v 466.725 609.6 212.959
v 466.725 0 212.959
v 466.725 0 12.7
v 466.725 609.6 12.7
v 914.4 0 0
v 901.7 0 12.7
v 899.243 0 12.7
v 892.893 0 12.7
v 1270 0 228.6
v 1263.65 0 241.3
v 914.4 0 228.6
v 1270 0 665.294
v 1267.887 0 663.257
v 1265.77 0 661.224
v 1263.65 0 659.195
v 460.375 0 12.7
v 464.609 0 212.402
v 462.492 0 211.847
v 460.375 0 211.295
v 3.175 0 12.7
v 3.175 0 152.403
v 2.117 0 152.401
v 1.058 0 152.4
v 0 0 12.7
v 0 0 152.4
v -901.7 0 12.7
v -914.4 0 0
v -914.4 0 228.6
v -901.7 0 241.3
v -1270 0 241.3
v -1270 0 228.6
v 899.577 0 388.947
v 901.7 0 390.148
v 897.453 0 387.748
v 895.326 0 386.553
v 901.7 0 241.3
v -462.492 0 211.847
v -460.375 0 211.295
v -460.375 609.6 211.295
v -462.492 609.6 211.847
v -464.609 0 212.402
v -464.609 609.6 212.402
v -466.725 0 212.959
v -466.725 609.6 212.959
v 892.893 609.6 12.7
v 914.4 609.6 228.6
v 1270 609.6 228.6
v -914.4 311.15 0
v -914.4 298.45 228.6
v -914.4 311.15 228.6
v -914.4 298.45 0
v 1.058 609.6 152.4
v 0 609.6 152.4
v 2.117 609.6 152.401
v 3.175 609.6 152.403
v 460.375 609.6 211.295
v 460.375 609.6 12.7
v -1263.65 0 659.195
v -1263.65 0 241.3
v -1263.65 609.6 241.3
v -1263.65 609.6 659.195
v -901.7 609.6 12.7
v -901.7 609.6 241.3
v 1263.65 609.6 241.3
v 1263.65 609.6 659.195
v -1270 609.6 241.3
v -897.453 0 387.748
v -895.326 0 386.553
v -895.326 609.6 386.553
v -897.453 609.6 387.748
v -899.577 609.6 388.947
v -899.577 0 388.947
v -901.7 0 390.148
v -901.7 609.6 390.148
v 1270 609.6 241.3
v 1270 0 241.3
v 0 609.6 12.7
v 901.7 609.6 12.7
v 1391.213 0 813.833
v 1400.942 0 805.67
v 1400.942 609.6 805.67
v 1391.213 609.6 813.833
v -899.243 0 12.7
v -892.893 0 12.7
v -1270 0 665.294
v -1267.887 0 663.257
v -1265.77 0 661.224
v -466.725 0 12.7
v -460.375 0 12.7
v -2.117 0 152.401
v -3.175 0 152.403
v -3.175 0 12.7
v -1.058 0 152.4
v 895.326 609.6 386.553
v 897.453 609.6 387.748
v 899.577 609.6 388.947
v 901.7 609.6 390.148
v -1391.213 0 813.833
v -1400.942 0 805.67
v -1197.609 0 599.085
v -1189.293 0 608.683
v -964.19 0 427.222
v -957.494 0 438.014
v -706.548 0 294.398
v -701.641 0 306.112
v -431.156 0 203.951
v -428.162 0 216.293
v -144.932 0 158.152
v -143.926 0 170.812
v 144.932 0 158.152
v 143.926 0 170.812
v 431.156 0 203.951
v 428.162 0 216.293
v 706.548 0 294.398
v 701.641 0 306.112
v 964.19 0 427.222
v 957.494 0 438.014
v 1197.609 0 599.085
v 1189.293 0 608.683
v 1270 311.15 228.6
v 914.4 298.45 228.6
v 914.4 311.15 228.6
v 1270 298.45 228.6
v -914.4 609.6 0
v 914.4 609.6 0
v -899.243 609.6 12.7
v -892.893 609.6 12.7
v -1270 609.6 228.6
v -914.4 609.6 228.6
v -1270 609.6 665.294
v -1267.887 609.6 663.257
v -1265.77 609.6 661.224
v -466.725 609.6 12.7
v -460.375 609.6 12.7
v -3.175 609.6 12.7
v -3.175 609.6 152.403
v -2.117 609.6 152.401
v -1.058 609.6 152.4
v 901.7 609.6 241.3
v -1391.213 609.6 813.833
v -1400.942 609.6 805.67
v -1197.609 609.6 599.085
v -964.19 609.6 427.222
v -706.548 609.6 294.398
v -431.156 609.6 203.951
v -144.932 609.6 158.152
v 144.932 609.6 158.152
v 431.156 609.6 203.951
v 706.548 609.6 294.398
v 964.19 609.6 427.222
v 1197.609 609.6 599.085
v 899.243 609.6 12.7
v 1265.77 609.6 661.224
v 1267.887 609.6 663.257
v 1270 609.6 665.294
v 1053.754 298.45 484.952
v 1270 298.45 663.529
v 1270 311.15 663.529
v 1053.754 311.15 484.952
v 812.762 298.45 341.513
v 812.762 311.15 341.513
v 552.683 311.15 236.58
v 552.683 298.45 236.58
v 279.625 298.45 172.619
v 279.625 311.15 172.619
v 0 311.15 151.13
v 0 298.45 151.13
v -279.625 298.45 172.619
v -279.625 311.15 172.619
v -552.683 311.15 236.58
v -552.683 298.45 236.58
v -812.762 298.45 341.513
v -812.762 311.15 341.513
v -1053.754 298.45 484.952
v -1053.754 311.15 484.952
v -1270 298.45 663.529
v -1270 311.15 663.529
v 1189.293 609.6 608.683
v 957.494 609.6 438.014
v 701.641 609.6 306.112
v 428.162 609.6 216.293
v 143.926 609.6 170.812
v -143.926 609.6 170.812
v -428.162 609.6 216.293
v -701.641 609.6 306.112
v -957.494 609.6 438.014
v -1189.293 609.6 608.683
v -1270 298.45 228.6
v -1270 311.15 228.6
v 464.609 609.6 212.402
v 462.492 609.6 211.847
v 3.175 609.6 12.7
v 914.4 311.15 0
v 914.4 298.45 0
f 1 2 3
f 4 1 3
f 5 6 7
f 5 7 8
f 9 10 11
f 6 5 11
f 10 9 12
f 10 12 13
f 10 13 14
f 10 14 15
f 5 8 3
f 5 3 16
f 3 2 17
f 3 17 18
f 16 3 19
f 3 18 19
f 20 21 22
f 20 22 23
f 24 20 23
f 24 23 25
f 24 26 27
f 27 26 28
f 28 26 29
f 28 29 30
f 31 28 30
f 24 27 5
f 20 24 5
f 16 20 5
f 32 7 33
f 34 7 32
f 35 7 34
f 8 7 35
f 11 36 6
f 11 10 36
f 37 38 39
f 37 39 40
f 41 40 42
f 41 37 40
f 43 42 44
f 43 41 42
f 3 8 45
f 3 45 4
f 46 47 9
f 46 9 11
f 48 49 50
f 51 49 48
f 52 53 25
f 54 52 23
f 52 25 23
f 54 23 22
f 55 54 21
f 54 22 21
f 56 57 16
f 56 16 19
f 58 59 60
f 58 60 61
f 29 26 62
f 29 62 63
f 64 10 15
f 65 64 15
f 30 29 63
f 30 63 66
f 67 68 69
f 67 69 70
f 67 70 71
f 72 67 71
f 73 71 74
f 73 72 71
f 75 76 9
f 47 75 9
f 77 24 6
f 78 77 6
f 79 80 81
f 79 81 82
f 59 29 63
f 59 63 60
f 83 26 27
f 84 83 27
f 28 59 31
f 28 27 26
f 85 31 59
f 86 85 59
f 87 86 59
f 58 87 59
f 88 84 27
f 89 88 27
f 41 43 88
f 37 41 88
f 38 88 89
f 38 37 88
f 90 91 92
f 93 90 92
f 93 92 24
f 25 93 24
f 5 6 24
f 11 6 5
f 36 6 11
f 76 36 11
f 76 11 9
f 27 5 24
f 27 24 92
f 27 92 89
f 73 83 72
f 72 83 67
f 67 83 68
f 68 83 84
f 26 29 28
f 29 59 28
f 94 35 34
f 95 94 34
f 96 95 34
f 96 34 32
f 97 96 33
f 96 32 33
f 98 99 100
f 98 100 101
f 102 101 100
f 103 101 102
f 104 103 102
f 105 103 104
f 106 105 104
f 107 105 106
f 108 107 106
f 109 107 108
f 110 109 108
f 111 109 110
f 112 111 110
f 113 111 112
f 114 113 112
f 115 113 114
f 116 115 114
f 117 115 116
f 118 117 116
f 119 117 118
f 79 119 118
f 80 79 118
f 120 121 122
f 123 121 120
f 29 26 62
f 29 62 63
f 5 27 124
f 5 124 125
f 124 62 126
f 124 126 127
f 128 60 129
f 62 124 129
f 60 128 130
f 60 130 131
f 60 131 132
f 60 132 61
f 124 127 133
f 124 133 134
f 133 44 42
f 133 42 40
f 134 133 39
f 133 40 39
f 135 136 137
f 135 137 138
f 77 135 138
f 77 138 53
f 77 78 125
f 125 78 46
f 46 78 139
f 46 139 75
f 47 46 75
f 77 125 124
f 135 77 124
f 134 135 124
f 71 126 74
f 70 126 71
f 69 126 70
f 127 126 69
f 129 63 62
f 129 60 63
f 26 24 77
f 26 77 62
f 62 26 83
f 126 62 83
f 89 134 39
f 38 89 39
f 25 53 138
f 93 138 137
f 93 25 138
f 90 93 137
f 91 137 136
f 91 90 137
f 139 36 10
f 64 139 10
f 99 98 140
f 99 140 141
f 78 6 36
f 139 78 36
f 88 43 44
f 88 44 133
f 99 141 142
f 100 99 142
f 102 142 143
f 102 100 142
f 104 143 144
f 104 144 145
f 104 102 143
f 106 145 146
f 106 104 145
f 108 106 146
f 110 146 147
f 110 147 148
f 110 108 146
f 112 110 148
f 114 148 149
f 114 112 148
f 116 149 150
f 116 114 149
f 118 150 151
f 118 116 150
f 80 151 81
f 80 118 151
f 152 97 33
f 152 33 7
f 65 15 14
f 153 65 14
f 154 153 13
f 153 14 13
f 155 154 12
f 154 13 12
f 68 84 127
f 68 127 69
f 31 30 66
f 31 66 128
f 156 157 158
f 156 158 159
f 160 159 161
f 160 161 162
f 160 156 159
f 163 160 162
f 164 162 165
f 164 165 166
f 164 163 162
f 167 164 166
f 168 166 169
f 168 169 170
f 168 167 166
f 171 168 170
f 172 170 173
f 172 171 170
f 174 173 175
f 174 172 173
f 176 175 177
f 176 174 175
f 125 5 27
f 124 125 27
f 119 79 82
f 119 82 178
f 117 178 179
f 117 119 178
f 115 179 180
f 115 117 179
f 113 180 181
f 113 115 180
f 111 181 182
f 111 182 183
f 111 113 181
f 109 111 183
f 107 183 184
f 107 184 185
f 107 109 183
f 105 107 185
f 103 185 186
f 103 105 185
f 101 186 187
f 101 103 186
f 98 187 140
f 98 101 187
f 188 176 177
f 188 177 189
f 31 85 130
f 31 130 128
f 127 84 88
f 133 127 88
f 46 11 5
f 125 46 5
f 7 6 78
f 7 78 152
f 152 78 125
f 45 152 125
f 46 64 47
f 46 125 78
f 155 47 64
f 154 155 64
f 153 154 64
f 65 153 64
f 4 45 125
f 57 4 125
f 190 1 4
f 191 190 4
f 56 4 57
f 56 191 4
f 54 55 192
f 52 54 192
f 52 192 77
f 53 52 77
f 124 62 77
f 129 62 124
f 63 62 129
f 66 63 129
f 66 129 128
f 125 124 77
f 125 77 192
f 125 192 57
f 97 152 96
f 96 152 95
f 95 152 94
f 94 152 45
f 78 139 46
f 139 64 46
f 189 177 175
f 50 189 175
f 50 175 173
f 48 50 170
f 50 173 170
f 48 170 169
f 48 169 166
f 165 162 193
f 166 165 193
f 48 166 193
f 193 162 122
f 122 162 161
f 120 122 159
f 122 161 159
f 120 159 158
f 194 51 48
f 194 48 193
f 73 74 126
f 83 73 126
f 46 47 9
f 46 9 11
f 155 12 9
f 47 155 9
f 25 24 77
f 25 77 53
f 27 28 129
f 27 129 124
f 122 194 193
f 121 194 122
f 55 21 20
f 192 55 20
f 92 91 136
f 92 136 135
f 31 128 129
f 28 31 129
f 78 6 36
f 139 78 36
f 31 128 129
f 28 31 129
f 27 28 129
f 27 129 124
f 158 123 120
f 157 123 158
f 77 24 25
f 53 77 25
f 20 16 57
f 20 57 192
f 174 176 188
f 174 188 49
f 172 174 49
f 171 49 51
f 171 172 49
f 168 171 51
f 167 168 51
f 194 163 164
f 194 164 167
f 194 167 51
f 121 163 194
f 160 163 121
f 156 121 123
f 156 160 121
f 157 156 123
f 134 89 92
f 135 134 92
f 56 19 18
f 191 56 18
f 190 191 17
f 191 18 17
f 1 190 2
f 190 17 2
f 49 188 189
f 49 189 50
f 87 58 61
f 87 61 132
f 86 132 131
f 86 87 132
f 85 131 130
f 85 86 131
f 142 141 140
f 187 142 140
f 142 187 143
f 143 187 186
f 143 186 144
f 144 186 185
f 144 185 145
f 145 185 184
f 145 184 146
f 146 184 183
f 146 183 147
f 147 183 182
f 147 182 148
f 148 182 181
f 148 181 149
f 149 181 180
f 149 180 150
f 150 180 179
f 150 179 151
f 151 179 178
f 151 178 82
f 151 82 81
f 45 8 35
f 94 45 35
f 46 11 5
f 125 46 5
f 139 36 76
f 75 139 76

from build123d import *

# Parameters (mm, degrees)
F1_DEPTH  = 609.6
F4_DEPTH  = 609.6
F6_DEPTH  = 609.6
F11_DEPTH = 12.7


with BuildPart() as f1:
    # F0 (on Front) → F1 (new body)
    with BuildSketch(Plane.XZ):
        Polygon((-914.4, 0), (0, 0), (0, 12.7), (-901.7, 12.7), (-901.7, 241.3), (-914.4, 241.3), (-1270, 241.3), (-1270, 228.6), (-914.4, 228.6), (-914.4, 12.7), align=None)
    extrude(amount=-F1_DEPTH)

    # F2: F1 across plane


with BuildPart() as f1_1:
    add(f1.part)
    add(f1.part.mirror(Plane.YZ))

    # F5 (on Front) → F6 (join)
    with BuildSketch(Plane.XZ):
        with BuildLine():
            ThreePointArc((-1263.65, 659.194660563), (-1266.8286703963, 662.2403494185), (-1270, 665.293681146))
            Line((-1270, 665.293681146), (-1270, 241.3))
            Line((-1270, 241.3), (-1263.65, 241.3))
            Line((-1263.65, 241.3), (-1263.65, 659.194660563))
        make_face()
        with BuildLine():
            Line((-460.375, 0), (-460.375, 211.2948332255))
            ThreePointArc((-460.375, 211.2948332255), (-463.5507465555, 212.1239288917), (-466.725, 212.9587228053))
            Line((-466.725, 212.9587228053), (-466.725, 0))
            Line((-466.725, 0), (-460.375, 0))
        make_face()
        with BuildLine():
            Line((-3.175, 0), (0, 0))
            Line((0, 0), (0, 152.4))
            ThreePointArc((0, 152.4), (-1.5875005981, 152.4006890197), (-3.175, 152.4027560785))
            Line((-3.175, 152.4027560785), (-3.175, 0))
        make_face()
        with BuildLine():
            Line((-892.81, 0), (-895.3264602776, 386.5527131284))
            ThreePointArc((-895.3264602776, 386.5527131284), (-898.5150283714, 388.3471556384), (-901.7, 390.1479738236))
            Line((-901.7, 390.1479738236), (-899.1601345556, 0))
            Line((-899.1601345556, 0), (-892.81, 0))
        make_face()
    extrude(amount=-F6_DEPTH)


with BuildPart() as f4:
    # F3 (on Front) → F4 (new body)
    with BuildSketch(Plane.XZ):
        with BuildLine():
            Line((-1391.2133131484, 813.8334220483), (-1400.942077576, 805.6700194053))
            ThreePointArc((-1400.942077576, 805.6700194053), (0, 152.4), (1400.942077576, 805.6700194053))
            Line((1400.942077576, 805.6700194053), (1391.2133131484, 813.8334220483))
            ThreePointArc((1391.2133131484, 813.8334220483), (767.5170251473, 335.2544279627), (0, 165.1))
            ThreePointArc((0, 165.1), (-767.5170251473, 335.2544279627), (-1391.2133131484, 813.8334220483))
        make_face()
    extrude(amount=-F4_DEPTH)


with BuildPart() as f7_1:
    # F7: instance of F1
    add(f1_1.part.mirror(Plane.YZ))


with BuildPart() as f11:
    # F10 (on offset) → F11 (new body)
    with BuildSketch(Plane.XZ.offset(-298.45)):
        with BuildLine():
            Line((-914.4, 228.6), (-914.4, 0))
            Line((-914.4, 0), (914.4, 0))
            Line((914.4, 0), (914.4, 228.6))
            Line((914.4, 228.6), (1270, 228.6))
            Line((1270, 228.6), (1270, 663.5292501918))
            ThreePointArc((1270, 663.5292501918), (0, 151.13), (-1270, 663.5292501918))
            Line((-1270, 663.5292501918), (-1270, 228.6))
            Line((-1270, 228.6), (-914.4, 228.6))
        make_face()
    extrude(amount=-F11_DEPTH)


solid = Compound([f1_1.part, f4.part, f7_1.part, f11.part])
